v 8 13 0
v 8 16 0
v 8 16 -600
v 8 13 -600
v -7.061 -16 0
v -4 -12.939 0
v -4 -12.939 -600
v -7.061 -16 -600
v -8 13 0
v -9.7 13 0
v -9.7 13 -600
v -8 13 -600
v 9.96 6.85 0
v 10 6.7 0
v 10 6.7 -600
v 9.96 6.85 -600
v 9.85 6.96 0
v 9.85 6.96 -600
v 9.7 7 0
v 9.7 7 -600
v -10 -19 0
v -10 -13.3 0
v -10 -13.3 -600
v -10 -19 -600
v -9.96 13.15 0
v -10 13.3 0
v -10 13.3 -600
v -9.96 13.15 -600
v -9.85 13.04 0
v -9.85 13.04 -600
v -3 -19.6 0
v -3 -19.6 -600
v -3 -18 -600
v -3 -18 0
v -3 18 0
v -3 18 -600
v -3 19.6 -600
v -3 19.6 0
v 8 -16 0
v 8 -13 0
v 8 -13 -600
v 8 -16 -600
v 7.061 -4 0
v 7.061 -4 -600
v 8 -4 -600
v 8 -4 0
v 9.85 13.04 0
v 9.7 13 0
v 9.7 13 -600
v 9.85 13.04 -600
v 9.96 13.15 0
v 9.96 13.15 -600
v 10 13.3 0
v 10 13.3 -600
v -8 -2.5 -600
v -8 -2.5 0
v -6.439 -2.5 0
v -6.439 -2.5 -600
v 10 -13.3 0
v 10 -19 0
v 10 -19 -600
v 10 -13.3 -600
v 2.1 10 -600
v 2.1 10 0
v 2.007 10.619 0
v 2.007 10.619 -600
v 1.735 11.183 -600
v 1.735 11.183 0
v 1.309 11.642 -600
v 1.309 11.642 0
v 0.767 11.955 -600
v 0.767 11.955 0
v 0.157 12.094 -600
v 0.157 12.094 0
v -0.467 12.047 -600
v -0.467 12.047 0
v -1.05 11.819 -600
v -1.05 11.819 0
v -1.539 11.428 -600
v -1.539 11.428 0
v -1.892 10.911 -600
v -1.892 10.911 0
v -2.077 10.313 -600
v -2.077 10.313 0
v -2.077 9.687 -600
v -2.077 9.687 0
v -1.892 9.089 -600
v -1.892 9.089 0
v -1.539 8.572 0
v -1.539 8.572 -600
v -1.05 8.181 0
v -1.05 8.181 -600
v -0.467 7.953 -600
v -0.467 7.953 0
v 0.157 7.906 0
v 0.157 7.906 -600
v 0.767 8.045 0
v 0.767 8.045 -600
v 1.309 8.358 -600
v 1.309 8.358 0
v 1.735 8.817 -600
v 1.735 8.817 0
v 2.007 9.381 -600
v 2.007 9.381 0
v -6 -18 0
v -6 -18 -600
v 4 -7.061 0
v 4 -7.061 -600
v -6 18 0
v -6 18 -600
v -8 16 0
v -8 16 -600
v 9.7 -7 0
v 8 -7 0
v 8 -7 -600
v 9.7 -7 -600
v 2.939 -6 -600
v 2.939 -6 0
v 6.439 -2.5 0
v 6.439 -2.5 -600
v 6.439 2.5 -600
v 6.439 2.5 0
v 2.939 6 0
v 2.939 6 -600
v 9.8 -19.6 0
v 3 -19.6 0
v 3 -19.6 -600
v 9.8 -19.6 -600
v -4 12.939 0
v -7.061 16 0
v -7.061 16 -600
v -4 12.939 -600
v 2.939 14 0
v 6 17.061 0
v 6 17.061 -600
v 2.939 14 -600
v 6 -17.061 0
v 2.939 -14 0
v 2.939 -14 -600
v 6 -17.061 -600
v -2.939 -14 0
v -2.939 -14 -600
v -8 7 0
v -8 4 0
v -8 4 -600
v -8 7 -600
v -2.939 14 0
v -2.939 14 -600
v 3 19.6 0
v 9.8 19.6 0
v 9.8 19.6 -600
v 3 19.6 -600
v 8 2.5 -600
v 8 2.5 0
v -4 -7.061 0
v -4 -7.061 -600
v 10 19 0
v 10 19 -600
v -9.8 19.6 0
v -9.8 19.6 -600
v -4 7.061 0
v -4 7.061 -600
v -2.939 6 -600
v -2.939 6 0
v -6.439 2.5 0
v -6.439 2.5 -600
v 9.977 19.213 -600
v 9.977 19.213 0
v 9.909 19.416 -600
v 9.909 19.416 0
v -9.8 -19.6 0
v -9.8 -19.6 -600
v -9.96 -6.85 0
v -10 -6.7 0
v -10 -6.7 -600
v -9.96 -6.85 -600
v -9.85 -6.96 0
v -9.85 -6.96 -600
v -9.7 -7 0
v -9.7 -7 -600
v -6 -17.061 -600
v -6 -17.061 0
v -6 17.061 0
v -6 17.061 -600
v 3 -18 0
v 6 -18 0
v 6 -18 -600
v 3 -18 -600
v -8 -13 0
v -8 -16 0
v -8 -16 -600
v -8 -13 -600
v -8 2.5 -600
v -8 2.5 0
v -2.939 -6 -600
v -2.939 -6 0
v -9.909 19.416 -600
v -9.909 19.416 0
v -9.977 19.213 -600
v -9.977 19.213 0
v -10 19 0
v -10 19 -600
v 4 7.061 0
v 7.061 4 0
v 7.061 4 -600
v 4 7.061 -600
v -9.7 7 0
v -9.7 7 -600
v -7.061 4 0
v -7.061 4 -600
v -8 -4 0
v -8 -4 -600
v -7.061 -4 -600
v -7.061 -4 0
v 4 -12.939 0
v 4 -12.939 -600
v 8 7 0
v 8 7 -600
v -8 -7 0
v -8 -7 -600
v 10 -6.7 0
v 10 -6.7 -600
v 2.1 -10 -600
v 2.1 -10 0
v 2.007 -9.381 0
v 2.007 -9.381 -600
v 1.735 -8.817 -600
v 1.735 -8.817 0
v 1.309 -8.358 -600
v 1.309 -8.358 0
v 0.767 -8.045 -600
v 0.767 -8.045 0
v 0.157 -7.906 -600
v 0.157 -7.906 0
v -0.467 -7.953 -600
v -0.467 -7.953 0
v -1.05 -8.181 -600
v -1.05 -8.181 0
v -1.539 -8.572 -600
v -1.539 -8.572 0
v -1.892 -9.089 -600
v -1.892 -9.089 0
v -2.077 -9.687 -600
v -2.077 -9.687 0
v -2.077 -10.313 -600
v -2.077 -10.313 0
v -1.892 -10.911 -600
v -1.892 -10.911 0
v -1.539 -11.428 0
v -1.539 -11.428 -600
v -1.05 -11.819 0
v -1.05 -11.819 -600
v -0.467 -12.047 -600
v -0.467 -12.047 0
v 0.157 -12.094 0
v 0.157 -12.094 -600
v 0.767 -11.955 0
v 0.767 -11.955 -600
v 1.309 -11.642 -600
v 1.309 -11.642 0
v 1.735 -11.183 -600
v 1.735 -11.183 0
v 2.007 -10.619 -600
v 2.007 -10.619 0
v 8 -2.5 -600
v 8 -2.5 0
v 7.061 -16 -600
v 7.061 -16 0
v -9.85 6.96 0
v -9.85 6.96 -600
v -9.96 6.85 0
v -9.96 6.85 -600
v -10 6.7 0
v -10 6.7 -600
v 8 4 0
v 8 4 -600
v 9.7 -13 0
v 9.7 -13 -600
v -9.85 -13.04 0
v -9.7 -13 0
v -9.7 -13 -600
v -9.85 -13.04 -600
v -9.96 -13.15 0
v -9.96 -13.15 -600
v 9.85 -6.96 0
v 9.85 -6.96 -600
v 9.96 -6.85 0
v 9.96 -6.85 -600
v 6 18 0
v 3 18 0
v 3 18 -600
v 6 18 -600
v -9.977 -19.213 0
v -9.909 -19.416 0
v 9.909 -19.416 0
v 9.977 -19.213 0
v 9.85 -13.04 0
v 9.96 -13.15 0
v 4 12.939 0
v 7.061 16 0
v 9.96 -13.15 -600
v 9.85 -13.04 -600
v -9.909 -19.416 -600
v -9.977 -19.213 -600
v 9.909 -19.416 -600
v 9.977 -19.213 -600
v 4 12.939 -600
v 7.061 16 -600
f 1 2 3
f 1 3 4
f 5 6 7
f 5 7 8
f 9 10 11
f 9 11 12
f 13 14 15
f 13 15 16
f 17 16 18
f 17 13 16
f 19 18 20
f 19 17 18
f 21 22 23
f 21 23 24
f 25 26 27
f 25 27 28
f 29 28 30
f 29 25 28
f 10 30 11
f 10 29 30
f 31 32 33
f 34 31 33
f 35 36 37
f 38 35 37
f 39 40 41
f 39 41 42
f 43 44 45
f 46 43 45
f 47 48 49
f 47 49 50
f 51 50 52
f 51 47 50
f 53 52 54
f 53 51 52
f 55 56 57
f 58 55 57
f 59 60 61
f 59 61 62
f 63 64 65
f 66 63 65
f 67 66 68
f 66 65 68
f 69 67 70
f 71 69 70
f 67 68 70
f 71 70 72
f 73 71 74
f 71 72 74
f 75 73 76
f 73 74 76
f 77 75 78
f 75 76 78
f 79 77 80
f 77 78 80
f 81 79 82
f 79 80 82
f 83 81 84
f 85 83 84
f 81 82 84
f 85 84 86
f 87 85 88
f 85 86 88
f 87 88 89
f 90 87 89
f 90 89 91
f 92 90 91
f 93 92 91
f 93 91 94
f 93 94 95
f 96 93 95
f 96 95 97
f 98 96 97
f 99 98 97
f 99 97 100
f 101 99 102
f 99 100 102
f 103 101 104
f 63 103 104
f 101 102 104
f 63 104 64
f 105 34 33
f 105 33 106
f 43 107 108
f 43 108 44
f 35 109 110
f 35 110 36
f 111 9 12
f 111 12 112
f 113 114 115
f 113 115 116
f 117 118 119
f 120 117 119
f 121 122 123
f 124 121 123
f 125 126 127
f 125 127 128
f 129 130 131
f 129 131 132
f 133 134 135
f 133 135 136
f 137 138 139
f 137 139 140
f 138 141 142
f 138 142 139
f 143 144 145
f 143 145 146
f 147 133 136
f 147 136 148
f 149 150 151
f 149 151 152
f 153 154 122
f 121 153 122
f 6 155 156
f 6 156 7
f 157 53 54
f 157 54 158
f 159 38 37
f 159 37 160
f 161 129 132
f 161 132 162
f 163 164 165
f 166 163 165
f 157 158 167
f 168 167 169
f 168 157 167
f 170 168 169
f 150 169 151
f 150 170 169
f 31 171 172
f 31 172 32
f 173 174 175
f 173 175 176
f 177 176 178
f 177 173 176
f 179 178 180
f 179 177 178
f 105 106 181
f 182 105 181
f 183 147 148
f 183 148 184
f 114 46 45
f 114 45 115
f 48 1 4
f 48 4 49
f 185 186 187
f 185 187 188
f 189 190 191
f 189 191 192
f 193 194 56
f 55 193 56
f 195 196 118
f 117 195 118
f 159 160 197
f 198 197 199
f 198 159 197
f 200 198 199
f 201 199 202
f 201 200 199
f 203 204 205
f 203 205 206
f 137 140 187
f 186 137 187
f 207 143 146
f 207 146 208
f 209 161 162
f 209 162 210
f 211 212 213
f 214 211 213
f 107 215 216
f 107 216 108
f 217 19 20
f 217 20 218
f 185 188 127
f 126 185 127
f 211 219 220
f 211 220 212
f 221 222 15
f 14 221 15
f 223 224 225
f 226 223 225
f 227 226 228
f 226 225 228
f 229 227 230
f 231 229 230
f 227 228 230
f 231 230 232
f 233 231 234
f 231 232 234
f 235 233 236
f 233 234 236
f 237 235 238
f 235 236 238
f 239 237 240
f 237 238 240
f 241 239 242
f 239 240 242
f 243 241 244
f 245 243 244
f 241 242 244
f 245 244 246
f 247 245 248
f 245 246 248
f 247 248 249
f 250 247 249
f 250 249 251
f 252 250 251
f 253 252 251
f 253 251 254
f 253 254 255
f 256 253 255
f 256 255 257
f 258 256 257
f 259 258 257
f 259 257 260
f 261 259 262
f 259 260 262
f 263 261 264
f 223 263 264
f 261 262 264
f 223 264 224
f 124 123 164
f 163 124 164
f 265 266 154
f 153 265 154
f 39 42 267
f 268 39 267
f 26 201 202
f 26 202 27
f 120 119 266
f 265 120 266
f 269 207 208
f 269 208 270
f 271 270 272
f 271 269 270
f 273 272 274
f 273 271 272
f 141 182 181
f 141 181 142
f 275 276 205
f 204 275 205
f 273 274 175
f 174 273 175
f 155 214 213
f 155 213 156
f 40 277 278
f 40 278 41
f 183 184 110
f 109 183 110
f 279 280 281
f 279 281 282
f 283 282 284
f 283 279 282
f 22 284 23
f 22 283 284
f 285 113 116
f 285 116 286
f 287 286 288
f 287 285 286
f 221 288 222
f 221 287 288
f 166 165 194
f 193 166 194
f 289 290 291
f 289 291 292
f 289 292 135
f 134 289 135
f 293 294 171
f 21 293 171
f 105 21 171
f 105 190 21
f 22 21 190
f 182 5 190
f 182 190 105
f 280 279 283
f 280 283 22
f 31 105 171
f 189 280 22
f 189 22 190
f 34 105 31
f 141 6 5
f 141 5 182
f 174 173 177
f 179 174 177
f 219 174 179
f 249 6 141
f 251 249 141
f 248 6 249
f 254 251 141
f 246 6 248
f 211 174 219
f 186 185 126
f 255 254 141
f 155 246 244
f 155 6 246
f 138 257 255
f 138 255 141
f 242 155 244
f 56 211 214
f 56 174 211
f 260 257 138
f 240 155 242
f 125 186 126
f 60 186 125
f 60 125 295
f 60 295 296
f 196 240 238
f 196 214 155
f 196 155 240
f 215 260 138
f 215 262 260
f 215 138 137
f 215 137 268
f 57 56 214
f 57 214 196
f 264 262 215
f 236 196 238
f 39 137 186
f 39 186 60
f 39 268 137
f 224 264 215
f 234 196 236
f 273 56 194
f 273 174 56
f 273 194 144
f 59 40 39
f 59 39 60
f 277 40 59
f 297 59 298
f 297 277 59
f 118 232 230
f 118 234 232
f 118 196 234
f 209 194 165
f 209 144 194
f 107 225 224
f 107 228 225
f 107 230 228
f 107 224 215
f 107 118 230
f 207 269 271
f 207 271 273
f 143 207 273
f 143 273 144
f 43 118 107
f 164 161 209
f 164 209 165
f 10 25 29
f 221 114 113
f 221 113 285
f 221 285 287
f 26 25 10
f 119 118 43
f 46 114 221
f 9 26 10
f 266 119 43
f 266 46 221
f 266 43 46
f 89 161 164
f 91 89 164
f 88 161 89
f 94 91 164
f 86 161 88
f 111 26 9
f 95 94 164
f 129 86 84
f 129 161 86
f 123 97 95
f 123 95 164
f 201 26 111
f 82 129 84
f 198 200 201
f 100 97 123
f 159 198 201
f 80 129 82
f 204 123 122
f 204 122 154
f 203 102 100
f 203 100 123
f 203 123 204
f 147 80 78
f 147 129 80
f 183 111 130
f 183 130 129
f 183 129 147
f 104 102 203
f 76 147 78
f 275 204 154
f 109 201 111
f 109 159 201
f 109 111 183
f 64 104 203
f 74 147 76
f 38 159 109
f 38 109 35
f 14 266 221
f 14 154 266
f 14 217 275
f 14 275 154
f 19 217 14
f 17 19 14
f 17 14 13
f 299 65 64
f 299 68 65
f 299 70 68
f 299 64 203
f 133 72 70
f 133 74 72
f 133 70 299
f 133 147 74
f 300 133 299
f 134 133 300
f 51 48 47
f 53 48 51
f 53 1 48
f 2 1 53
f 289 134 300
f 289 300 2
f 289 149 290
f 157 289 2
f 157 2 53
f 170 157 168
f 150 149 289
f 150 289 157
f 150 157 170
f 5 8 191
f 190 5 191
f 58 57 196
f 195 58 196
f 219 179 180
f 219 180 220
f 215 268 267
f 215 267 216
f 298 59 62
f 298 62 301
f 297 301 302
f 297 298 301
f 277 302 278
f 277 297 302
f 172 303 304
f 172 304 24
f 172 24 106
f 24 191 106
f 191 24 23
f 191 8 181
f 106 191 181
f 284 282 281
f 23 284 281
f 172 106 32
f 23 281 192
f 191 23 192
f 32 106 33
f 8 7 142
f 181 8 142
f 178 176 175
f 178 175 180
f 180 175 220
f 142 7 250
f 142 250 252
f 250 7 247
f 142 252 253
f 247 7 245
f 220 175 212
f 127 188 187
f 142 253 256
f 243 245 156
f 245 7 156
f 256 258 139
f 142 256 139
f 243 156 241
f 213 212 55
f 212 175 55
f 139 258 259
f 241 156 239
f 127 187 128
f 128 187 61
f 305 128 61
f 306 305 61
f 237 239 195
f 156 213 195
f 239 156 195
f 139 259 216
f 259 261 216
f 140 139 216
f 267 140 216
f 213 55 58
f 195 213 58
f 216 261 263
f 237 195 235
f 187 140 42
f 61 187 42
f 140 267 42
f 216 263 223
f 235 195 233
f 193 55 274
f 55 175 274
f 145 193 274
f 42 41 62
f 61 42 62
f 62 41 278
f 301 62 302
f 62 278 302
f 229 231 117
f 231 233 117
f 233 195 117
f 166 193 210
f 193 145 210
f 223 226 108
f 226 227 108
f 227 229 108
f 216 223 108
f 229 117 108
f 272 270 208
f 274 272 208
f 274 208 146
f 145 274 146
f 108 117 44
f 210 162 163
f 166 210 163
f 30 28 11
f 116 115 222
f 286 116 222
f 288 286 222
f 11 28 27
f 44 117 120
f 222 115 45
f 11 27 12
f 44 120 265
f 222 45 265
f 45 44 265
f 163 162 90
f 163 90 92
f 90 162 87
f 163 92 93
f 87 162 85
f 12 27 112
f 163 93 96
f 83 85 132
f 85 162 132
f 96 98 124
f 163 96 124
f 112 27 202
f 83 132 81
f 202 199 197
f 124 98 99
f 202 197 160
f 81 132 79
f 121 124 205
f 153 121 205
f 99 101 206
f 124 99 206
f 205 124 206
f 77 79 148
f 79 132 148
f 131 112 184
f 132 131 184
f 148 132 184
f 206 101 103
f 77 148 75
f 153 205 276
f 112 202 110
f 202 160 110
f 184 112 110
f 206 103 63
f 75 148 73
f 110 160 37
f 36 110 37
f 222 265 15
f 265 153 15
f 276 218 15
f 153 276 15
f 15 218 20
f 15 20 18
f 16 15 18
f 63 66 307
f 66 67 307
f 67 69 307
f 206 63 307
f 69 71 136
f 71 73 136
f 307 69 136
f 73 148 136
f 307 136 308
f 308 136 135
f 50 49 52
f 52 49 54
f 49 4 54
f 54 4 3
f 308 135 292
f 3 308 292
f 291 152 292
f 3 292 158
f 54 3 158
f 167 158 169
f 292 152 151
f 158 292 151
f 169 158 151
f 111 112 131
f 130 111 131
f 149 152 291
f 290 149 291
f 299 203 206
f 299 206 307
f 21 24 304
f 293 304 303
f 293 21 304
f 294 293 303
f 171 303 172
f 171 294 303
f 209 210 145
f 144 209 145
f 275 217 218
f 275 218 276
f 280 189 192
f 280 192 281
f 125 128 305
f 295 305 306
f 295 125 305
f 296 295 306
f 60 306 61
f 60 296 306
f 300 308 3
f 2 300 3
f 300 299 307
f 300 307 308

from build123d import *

# Parameters (mm, degrees)
SKETCH_1_R      = 2.1
EXTRUDE_1_DEPTH = 600


with BuildPart() as part:
    # 草图1 → 凸台-拉伸1 (new body)
    with BuildSketch(Plane.XY):
        with BuildLine():
            Line((-10, 19), (-10, 13.3))
            ThreePointArc((-10, 13.3), (-9.912132034, 13.087867966), (-9.7, 13))
            Line((-9.7, 13), (-8, 13))
            Line((-8, 13), (-8, 16))
            Line((-8, 16), (-7.060660172, 16))
            Line((-7.060660172, 16), (-4, 12.939339828))
            Line((-4, 12.939339828), (-4, 7.060660172))
            Line((-4, 7.060660172), (-7.060660172, 4))
            Line((-7.060660172, 4), (-8, 4))
            Line((-8, 4), (-8, 7))
            Line((-8, 7), (-9.7, 7))
            ThreePointArc((-9.7, 7), (-9.912132034, 6.912132034), (-10, 6.7))
            Line((-10, 6.7), (-10, -6.7))
            ThreePointArc((-10, -6.7), (-9.912132034, -6.912132034), (-9.7, -7))
            Line((-9.7, -7), (-8, -7))
            Line((-8, -7), (-8, -4))
            Line((-8, -4), (-7.060660172, -4))
            Line((-7.060660172, -4), (-4, -7.060660172))
            Line((-4, -7.060660172), (-4, -12.939339828))
            Line((-4, -12.939339828), (-7.060660172, -16))
            Line((-7.060660172, -16), (-8, -16))
            Line((-8, -16), (-8, -13))
            Line((-8, -13), (-9.7, -13))
            ThreePointArc((-9.7, -13), (-9.912132034, -13.087867966), (-10, -13.3))
            Line((-10, -13.3), (-10, -19))
            ThreePointArc((-10, -19), (-9.948683298, -19.316227766), (-9.8, -19.6))
            Line((-9.8, -19.6), (-3, -19.6))
            Line((-3, -19.6), (-3, -18))
            Line((-3, -18), (-6, -18))
            Line((-6, -18), (-6, -17.060660172))
            Line((-6, -17.060660172), (-2.939339828, -14))
            Line((-2.939339828, -14), (2.939339828, -14))
            Line((2.939339828, -14), (6, -17.060660172))
            Line((6, -17.060660172), (6, -18))
            Line((6, -18), (3, -18))
            Line((3, -18), (3, -19.6))
            Line((3, -19.6), (9.8, -19.6))
            ThreePointArc((9.8, -19.6), (9.948683298, -19.316227766), (10, -19))
            Line((10, -19), (10, -13.3))
            ThreePointArc((10, -13.3), (9.912132034, -13.087867966), (9.7, -13))
            Line((9.7, -13), (8, -13))
            Line((8, -13), (8, -16))
            Line((8, -16), (7.060660172, -16))
            Line((7.060660172, -16), (4, -12.939339828))
            Line((4, -12.939339828), (4, -7.060660172))
            Line((4, -7.060660172), (7.060660172, -4))
            Line((7.060660172, -4), (8, -4))
            Line((8, -4), (8, -7))
            Line((8, -7), (9.7, -7))
            ThreePointArc((9.7, -7), (9.912132034, -6.912132034), (10, -6.7))
            Line((10, -6.7), (10, 6.7))
            ThreePointArc((10, 6.7), (9.912132034, 6.912132034), (9.7, 7))
            Line((9.7, 7), (8, 7))
            Line((8, 7), (8, 4))
            Line((8, 4), (7.060660172, 4))
            Line((7.060660172, 4), (4, 7.060660172))
            Line((4, 7.060660172), (4, 12.939339828))
            Line((4, 12.939339828), (7.060660172, 16))
            Line((7.060660172, 16), (8, 16))
            Line((8, 16), (8, 13))
            Line((8, 13), (9.7, 13))
            ThreePointArc((9.7, 13), (9.912132034, 13.087867966), (10, 13.3))
            Line((10, 13.3), (10, 19))
            ThreePointArc((10, 19), (9.948683298, 19.316227766), (9.8, 19.6))
            Line((9.8, 19.6), (3, 19.6))
            Line((3, 19.6), (3, 18))
            Line((3, 18), (6, 18))
            Line((6, 18), (6, 17.060660172))
            Line((6, 17.060660172), (2.939339828, 14))
            Line((2.939339828, 14), (-2.939339828, 14))
            Line((-2.939339828, 14), (-6, 17.060660172))
            Line((-6, 17.060660172), (-6, 18))
            Line((-6, 18), (-3, 18))
            Line((-3, 18), (-3, 19.6))
            Line((-3, 19.6), (-9.8, 19.6))
            ThreePointArc((-9.8, 19.6), (-9.948683298, 19.316227766), (-10, 19))
        make_face()
        with Locations((0, -10)):
            Circle(SKETCH_1_R, mode=Mode.SUBTRACT)
        with Locations((0, 10)):
            Circle(SKETCH_1_R, mode=Mode.SUBTRACT)
        Polygon((-8, -2.5), (-6.439339828, -2.5), (-2.939339828, -6), (2.939339828, -6), (6.439339828, -2.5), (8, -2.5), (8, 2.5), (6.439339828, 2.5), (2.939339828, 6), (-2.939339828, 6), (-6.439339828, 2.5), (-8, 2.5), align=None, mode=Mode.SUBTRACT)
    extrude(amount=-EXTRUDE_1_DEPTH)


solid = part.part
